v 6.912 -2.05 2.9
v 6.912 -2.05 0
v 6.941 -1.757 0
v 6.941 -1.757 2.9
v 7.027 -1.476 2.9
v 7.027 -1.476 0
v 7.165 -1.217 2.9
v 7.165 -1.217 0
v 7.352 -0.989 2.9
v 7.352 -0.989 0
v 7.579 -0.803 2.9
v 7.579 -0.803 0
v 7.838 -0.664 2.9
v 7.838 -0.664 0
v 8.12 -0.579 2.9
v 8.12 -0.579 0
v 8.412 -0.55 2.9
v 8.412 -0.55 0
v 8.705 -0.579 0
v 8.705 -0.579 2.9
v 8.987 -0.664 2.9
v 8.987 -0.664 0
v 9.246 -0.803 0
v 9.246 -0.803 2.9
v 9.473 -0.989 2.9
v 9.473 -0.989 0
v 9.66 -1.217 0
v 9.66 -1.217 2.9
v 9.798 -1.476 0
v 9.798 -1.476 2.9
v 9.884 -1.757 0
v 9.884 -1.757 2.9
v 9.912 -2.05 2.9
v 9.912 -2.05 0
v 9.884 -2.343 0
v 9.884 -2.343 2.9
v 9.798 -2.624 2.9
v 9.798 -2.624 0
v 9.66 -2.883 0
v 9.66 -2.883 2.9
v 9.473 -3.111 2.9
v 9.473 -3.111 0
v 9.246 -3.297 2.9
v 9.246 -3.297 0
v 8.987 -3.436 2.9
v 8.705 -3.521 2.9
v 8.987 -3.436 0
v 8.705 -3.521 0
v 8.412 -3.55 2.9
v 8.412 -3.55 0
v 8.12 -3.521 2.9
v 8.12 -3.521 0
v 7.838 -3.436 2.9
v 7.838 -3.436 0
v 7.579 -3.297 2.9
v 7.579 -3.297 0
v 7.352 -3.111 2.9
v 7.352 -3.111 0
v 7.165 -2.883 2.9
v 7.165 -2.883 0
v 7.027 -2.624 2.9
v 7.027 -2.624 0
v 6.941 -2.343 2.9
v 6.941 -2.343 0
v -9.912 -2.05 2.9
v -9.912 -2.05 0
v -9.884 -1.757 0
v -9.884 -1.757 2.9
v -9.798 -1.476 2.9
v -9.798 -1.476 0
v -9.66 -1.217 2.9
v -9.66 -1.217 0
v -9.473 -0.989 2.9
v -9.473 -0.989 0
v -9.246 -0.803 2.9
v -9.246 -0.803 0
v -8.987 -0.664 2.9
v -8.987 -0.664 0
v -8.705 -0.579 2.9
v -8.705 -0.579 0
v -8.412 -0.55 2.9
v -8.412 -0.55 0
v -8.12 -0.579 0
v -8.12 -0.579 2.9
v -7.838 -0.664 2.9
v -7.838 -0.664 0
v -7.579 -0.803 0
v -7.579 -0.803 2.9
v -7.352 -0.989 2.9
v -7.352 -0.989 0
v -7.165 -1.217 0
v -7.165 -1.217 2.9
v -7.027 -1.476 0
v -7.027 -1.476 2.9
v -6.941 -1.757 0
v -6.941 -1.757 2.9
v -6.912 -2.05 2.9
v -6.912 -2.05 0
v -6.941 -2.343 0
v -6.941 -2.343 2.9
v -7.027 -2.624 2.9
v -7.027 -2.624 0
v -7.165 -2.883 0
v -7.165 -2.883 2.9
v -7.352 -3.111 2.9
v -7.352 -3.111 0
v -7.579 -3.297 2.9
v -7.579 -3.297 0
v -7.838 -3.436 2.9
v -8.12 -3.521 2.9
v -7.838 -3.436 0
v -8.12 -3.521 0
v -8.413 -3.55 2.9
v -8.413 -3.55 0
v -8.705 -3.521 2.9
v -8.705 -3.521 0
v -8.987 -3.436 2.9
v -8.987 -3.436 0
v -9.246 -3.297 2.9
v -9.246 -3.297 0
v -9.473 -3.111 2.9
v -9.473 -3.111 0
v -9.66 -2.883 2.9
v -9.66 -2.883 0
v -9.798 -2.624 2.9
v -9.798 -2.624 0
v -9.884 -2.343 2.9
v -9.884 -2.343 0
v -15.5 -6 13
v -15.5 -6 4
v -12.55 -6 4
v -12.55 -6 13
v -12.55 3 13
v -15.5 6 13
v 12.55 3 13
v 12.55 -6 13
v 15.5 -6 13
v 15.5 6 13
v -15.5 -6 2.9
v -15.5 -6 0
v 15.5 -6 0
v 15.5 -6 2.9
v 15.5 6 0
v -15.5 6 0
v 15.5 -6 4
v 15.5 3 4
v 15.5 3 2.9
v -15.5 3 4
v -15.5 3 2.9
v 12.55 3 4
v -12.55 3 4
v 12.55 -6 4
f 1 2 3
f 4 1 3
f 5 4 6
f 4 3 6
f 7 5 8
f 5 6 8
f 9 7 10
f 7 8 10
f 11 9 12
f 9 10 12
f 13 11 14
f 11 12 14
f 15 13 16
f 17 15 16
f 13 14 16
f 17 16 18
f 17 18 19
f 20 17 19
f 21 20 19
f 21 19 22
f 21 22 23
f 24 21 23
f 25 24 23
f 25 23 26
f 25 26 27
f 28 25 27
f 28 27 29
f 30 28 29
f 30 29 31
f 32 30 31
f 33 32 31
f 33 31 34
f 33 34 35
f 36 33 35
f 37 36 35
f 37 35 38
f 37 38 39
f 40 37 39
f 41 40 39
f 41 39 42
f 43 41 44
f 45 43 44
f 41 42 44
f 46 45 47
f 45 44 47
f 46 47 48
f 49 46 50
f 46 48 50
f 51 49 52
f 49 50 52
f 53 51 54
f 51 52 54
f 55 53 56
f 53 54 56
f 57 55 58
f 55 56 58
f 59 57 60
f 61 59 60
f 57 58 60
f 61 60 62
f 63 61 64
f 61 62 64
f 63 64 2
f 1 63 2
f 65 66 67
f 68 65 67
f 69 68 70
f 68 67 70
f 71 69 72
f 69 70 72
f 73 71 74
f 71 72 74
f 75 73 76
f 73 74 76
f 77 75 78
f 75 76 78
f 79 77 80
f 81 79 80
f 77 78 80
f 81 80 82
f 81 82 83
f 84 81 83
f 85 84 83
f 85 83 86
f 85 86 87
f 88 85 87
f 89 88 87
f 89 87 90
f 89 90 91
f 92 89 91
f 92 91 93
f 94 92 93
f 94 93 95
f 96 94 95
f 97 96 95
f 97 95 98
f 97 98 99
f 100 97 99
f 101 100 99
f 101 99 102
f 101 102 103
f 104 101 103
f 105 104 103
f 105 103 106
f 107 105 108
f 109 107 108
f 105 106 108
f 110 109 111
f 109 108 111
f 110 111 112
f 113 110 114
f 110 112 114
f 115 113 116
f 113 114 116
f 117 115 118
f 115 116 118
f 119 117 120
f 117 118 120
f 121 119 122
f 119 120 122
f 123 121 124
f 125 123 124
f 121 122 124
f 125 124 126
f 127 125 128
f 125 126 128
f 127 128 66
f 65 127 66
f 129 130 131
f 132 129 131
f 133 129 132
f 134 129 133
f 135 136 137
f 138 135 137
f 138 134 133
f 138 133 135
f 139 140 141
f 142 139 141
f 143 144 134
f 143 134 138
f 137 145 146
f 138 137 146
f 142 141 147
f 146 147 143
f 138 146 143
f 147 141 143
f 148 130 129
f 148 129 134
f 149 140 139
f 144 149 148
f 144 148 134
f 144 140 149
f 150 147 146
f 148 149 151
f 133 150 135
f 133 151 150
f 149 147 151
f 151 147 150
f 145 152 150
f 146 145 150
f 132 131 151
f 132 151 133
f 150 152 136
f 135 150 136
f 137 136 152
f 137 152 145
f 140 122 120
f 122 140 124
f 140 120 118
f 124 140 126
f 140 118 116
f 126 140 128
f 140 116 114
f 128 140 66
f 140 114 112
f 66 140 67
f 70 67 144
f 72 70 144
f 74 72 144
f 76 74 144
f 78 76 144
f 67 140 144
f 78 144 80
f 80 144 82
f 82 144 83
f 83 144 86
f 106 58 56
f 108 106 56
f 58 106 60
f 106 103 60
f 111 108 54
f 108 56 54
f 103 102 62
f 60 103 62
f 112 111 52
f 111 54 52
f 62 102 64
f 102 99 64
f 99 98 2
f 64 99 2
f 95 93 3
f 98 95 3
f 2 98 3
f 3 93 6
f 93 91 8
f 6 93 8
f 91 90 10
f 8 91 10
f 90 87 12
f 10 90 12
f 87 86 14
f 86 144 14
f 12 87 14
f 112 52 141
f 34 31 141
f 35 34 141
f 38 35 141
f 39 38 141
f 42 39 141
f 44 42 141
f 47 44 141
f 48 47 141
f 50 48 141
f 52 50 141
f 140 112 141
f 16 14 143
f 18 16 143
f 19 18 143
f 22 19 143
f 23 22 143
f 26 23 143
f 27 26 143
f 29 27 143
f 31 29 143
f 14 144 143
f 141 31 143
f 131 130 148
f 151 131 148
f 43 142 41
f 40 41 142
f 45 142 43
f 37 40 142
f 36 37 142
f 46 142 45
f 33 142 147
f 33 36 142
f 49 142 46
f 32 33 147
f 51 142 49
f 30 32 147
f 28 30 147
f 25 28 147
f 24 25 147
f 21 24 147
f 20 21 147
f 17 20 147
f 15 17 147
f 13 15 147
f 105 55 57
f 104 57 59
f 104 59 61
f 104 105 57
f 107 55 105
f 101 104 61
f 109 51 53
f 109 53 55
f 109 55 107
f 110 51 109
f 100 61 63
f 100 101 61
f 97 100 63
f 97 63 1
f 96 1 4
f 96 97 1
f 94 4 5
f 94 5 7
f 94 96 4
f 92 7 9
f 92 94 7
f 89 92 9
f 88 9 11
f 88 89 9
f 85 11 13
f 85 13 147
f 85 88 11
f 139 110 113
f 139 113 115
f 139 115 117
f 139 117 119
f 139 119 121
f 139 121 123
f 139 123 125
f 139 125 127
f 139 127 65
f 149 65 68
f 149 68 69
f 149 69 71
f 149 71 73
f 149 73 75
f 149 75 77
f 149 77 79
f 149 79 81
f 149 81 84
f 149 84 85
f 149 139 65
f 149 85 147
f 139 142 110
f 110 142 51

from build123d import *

# Parameters (mm, degrees)
CROQUIS2_W              = 31
CROQUIS2_H              = 12
SALIENTE_EXTRUIR1_DEPTH = 13
CROQUIS3_W              = 25.1
CROQUIS3_H              = 10.1
CORTAR_EXTRUIR1_DEPTH   = 9
CROQUIS6_W              = 1.1
CROQUIS6_H              = 9
CORTAR_EXTRUIR3_DEPTH   = 32
CROQUIS7_R              = 1.5
CORTAR_EXTRUIR4_DEPTH   = 14


with BuildPart() as part:
    # Croquis2 → Saliente-Extruir1 (new body)
    with BuildSketch(Plane.XY):
        Rectangle(CROQUIS2_W, CROQUIS2_H)
    extrude(amount=SALIENTE_EXTRUIR1_DEPTH)

    # Croquis3 → Cortar-Extruir1 (cut)
    with BuildSketch(Plane.XZ.offset(6)):
        with Locations((0, 7.95)):
            Rectangle(CROQUIS3_W, CROQUIS3_H)
    extrude(amount=-CORTAR_EXTRUIR1_DEPTH, mode=Mode.SUBTRACT)

    # Croquis6 → Cortar-Extruir3 (cut, through all)
    with BuildSketch(Plane.ZY.offset(15.5)):
        with Locations((3.45, -1.5)):
            Rectangle(CROQUIS6_W, CROQUIS6_H)
    extrude(amount=-CORTAR_EXTRUIR3_DEPTH, mode=Mode.SUBTRACT)

    # Croquis7 → Cortar-Extruir4 (cut, through all)
    with BuildSketch(Plane(origin=(0, 0, 0), x_dir=(-1, 0, 0), z_dir=(0, 0, -1))):
        with Locations((-8.4125, -2.05)):
            Circle(CROQUIS7_R)
        with Locations((8.4125, -2.05)):
            Circle(CROQUIS7_R)
    extrude(amount=-CORTAR_EXTRUIR4_DEPTH, mode=Mode.SUBTRACT)


solid = part.part
